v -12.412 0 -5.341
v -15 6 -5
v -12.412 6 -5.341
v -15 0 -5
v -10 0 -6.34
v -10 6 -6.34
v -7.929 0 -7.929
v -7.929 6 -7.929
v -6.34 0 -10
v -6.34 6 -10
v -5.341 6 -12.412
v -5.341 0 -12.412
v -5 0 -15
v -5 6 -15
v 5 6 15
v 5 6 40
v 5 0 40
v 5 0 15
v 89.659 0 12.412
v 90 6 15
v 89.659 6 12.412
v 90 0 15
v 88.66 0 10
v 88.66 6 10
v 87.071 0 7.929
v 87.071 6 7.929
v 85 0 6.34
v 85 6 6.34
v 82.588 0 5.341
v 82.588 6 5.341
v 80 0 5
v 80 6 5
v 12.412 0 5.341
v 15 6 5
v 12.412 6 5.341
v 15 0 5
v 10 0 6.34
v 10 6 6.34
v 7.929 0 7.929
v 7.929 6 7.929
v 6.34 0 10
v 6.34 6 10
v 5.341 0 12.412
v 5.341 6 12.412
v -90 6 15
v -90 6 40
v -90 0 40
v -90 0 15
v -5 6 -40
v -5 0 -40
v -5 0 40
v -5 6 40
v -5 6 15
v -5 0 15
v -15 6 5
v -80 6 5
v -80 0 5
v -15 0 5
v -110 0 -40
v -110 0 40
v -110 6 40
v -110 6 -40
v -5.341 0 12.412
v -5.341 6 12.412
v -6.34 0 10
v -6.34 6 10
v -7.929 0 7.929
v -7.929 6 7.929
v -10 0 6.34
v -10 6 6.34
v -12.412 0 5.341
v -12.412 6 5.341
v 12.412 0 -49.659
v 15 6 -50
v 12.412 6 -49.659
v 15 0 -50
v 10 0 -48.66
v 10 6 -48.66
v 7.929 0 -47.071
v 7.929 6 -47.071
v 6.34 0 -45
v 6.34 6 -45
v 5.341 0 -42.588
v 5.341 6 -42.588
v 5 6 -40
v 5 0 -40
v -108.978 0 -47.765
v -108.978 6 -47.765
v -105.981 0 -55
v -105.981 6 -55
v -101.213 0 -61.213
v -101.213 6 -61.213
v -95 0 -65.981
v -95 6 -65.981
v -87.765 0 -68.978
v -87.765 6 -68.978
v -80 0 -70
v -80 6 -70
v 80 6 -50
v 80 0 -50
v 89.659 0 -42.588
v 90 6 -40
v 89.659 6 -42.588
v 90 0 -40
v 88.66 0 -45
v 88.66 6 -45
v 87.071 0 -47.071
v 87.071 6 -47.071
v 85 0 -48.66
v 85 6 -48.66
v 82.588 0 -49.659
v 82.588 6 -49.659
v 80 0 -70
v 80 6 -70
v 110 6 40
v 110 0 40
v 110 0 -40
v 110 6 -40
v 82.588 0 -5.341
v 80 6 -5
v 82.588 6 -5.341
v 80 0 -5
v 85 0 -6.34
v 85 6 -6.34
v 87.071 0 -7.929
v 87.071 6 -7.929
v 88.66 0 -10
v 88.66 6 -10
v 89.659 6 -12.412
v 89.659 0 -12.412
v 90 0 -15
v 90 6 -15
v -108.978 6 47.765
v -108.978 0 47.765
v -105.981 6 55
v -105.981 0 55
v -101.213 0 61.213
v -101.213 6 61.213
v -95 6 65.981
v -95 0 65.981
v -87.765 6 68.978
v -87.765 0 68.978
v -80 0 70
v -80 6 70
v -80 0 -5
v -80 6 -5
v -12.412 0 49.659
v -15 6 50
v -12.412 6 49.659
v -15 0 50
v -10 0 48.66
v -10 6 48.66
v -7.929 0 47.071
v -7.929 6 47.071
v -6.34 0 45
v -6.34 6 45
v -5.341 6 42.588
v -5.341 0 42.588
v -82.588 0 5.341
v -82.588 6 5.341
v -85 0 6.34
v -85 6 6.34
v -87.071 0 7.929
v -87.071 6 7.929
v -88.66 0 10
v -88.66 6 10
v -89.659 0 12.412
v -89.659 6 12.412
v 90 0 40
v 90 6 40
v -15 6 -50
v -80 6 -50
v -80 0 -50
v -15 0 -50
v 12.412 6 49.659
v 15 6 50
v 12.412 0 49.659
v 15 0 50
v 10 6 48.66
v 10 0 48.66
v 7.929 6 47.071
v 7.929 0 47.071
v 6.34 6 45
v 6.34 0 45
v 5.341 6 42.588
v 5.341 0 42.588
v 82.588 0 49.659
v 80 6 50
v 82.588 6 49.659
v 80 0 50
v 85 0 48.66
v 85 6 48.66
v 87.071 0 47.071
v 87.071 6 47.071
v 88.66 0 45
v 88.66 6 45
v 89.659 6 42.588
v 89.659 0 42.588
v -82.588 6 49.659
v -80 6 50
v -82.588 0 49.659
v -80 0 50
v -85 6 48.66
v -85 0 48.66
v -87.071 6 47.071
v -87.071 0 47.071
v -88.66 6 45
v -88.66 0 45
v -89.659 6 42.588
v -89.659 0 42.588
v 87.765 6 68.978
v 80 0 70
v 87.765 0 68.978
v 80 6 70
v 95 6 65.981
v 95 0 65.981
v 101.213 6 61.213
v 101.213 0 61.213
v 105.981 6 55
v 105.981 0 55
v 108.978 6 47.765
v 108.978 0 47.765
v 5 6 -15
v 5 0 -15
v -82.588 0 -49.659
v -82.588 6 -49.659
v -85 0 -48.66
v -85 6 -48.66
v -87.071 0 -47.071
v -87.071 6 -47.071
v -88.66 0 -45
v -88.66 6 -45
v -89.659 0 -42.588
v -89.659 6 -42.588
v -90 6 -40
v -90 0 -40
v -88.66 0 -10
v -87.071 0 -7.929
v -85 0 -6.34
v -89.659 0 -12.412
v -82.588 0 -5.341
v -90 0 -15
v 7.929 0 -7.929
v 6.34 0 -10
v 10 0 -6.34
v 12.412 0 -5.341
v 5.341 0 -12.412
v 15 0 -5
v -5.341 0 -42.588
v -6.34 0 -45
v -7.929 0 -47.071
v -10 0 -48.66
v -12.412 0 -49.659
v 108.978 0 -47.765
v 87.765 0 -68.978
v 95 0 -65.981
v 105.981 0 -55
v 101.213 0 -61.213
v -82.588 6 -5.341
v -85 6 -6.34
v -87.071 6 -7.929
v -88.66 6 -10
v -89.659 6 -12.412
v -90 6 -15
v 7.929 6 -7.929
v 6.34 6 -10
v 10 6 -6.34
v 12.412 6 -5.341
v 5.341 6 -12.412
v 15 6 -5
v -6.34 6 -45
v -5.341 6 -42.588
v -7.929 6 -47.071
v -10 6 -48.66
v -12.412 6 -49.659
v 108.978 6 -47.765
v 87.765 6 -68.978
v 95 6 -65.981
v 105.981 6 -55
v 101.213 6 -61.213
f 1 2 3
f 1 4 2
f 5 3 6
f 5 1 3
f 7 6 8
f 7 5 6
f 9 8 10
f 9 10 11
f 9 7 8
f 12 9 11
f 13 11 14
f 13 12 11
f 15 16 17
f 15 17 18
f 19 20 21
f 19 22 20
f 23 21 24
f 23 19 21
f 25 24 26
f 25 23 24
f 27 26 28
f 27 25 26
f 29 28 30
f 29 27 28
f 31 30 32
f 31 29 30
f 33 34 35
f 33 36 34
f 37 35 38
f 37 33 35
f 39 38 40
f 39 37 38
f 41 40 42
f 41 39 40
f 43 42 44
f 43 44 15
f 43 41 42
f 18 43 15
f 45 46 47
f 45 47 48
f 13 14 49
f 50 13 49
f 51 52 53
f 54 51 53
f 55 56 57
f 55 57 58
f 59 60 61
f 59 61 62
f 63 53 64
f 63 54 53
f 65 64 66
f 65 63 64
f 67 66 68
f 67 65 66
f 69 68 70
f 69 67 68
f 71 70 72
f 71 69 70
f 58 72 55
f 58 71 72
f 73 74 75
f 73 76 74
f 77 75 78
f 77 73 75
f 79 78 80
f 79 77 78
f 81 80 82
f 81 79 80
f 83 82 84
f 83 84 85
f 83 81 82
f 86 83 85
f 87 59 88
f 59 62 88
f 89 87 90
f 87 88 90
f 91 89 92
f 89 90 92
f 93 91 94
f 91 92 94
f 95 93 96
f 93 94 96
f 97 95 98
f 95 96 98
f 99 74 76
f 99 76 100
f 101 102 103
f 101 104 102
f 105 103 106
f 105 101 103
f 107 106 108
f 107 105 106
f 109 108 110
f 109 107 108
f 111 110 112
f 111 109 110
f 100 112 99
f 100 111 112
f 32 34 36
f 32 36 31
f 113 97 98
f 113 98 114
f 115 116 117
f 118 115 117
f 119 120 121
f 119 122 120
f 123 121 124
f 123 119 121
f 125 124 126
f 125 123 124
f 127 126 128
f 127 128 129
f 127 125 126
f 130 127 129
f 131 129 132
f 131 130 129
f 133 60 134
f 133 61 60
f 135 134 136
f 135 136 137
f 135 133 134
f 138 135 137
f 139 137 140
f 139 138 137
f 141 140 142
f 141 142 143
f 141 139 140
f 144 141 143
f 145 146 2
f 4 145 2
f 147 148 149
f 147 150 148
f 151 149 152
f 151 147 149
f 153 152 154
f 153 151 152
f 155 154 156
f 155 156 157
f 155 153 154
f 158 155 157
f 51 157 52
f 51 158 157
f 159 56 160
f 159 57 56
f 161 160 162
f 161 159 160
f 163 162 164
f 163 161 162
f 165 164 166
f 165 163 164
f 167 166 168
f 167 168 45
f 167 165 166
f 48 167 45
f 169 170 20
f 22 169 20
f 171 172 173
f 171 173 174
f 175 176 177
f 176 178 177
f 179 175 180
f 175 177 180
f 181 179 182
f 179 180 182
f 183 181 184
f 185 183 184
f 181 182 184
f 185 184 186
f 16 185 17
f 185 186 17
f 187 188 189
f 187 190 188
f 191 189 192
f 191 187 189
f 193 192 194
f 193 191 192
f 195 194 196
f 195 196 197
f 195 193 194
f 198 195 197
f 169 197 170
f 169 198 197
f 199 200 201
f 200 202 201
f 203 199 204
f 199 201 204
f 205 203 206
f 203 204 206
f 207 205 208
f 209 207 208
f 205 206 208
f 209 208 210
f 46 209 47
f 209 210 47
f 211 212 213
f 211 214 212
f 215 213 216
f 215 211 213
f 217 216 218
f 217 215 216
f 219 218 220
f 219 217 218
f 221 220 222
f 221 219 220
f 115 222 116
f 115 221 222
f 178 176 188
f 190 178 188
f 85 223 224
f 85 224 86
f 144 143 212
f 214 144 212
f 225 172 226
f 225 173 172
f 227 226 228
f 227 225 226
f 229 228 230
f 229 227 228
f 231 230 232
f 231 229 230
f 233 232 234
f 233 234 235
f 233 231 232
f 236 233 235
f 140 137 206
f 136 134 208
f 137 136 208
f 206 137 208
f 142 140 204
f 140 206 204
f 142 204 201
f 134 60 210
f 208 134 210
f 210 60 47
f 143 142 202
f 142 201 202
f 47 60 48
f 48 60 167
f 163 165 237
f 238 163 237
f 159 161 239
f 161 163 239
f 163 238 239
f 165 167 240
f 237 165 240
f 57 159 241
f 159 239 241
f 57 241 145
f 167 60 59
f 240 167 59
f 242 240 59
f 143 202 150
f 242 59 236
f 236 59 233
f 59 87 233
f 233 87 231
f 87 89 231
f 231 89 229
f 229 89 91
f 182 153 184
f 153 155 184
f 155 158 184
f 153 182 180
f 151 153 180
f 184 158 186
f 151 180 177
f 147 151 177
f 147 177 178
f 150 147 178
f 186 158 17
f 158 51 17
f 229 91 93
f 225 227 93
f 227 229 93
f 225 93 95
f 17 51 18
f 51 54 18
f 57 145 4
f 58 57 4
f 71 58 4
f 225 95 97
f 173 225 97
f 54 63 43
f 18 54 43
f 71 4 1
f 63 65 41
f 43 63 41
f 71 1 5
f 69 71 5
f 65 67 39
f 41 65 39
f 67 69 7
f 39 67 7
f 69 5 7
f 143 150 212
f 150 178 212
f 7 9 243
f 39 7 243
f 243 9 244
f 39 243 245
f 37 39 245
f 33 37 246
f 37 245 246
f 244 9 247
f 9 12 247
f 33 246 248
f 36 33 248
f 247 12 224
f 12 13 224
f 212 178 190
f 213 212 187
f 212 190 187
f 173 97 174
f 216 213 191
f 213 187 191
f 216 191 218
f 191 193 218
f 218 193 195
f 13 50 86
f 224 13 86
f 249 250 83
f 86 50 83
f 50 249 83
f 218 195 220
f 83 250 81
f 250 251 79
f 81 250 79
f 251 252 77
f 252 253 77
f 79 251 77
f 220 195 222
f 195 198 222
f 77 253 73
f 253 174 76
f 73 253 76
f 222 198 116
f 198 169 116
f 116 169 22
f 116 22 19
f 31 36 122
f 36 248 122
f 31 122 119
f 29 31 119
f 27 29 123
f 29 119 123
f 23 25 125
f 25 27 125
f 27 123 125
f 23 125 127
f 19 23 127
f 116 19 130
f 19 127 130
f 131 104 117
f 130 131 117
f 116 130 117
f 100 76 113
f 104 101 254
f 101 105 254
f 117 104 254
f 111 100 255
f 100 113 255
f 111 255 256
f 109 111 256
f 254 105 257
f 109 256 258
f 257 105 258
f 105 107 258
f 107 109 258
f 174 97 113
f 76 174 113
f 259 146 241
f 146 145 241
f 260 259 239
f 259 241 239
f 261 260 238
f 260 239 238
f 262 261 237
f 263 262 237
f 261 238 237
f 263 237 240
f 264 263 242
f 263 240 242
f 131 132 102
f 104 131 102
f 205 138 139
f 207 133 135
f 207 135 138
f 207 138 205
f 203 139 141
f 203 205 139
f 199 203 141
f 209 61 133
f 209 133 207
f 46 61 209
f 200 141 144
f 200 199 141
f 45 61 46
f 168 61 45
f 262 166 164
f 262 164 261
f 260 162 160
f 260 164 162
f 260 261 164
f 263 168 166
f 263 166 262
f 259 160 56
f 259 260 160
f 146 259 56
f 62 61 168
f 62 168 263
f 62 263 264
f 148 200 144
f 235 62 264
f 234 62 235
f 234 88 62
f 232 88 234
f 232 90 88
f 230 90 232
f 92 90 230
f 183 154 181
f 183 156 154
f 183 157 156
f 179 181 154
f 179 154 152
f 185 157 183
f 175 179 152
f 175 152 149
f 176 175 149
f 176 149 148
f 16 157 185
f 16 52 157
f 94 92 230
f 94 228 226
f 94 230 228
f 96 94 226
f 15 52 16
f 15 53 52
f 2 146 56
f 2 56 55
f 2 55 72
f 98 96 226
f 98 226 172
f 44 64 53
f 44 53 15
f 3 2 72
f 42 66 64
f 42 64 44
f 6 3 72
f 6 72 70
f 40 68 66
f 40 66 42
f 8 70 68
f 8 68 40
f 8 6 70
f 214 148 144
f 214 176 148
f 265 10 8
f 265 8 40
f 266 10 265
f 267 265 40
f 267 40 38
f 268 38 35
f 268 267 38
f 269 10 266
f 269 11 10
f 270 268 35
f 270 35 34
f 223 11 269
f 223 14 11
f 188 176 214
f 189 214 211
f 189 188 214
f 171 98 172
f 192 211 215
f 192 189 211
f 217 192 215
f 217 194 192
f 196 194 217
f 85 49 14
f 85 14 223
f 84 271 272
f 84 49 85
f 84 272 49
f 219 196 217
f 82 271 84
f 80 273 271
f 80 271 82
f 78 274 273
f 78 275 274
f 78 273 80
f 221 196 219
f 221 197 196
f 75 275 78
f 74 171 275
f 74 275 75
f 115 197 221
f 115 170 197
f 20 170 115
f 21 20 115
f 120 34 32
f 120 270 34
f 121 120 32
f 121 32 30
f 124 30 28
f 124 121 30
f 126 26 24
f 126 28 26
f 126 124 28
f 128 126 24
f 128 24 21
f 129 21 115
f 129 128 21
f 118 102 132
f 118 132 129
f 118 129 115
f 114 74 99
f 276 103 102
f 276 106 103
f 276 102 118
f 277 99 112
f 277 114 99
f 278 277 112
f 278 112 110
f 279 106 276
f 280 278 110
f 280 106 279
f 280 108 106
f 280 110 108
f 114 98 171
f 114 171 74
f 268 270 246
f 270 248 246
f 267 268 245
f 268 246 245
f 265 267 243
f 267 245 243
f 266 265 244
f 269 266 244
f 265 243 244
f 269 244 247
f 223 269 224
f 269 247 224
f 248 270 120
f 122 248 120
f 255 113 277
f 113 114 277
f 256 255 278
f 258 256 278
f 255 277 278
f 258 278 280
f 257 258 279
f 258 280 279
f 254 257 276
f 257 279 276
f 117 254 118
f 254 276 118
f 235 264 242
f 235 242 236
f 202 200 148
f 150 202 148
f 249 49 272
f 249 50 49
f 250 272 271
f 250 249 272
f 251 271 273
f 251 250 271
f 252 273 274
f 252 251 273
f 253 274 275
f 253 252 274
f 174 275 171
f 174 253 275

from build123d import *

# Parameters (mm, degrees)
ESBO_O1_W                = 220
ESBO_O1_H                = 140
RESSALTO_EXTRUS_O1_DEPTH = 6
ESBO_O2_W                = 85
ESBO_O2_H                = 45
CORTE_EXTRUS_O1_DEPTH    = 6
FILETE1_R                = 30
FILETE2_R                = 10


with BuildPart() as part:
    # Esboço1 → Ressalto-extrusão1 (new body)
    with BuildSketch(Plane(origin=(0, 0, 0), x_dir=(1, 0, 0), z_dir=(0, 1, 0))):
        Rectangle(ESBO_O1_W, ESBO_O1_H)
    extrude(amount=RESSALTO_EXTRUS_O1_DEPTH)

    # Esboço2 → Corte-extrusão1 (cut)
    with BuildSketch(Plane(origin=(0, 6, 0), x_dir=(1, 0, 0), z_dir=(0, 1, 0))):
        with Locations((47.5, 27.5)):
            Rectangle(ESBO_O2_W, ESBO_O2_H)
        with Locations((-47.5, 27.5)):
            Rectangle(ESBO_O2_W, ESBO_O2_H)
        with Locations((-47.5, -27.5)):
            Rectangle(ESBO_O2_W, ESBO_O2_H)
        with Locations((47.5, -27.5)):
            Rectangle(ESBO_O2_W, ESBO_O2_H)
    extrude(amount=-CORTE_EXTRUS_O1_DEPTH, mode=Mode.SUBTRACT)

    # Filete1
    filete1_edges = [part.edges().sort_by_distance(p)[0] for p in [
        (-110, 3, -70),
        (110, 3, -70),
        (110, 3, 70),
        (-110, 3, 70),
    ]]
    fillet(filete1_edges, radius=FILETE1_R)

    # Filete2
    filete2_edges = [part.edges().sort_by_distance(p)[0] for p in [
        (-90, 3, -50),
        (-5, 3, -50),
        (-5, 3, -5),
        (-90, 3, -5),
        (-90, 3, 50),
        (-90, 3, 5),
        (-5, 3, 5),
        (-5, 3, 50),
        (90, 3, 50),
        (5, 3, 50),
        (5, 3, 5),
        (90, 3, 5),
        (5, 3, -50),
        (90, 3, -50),
        (90, 3, -5),
        (5, 3, -5),
    ]]
    fillet(filete2_edges, radius=FILETE2_R)


solid = part.part
